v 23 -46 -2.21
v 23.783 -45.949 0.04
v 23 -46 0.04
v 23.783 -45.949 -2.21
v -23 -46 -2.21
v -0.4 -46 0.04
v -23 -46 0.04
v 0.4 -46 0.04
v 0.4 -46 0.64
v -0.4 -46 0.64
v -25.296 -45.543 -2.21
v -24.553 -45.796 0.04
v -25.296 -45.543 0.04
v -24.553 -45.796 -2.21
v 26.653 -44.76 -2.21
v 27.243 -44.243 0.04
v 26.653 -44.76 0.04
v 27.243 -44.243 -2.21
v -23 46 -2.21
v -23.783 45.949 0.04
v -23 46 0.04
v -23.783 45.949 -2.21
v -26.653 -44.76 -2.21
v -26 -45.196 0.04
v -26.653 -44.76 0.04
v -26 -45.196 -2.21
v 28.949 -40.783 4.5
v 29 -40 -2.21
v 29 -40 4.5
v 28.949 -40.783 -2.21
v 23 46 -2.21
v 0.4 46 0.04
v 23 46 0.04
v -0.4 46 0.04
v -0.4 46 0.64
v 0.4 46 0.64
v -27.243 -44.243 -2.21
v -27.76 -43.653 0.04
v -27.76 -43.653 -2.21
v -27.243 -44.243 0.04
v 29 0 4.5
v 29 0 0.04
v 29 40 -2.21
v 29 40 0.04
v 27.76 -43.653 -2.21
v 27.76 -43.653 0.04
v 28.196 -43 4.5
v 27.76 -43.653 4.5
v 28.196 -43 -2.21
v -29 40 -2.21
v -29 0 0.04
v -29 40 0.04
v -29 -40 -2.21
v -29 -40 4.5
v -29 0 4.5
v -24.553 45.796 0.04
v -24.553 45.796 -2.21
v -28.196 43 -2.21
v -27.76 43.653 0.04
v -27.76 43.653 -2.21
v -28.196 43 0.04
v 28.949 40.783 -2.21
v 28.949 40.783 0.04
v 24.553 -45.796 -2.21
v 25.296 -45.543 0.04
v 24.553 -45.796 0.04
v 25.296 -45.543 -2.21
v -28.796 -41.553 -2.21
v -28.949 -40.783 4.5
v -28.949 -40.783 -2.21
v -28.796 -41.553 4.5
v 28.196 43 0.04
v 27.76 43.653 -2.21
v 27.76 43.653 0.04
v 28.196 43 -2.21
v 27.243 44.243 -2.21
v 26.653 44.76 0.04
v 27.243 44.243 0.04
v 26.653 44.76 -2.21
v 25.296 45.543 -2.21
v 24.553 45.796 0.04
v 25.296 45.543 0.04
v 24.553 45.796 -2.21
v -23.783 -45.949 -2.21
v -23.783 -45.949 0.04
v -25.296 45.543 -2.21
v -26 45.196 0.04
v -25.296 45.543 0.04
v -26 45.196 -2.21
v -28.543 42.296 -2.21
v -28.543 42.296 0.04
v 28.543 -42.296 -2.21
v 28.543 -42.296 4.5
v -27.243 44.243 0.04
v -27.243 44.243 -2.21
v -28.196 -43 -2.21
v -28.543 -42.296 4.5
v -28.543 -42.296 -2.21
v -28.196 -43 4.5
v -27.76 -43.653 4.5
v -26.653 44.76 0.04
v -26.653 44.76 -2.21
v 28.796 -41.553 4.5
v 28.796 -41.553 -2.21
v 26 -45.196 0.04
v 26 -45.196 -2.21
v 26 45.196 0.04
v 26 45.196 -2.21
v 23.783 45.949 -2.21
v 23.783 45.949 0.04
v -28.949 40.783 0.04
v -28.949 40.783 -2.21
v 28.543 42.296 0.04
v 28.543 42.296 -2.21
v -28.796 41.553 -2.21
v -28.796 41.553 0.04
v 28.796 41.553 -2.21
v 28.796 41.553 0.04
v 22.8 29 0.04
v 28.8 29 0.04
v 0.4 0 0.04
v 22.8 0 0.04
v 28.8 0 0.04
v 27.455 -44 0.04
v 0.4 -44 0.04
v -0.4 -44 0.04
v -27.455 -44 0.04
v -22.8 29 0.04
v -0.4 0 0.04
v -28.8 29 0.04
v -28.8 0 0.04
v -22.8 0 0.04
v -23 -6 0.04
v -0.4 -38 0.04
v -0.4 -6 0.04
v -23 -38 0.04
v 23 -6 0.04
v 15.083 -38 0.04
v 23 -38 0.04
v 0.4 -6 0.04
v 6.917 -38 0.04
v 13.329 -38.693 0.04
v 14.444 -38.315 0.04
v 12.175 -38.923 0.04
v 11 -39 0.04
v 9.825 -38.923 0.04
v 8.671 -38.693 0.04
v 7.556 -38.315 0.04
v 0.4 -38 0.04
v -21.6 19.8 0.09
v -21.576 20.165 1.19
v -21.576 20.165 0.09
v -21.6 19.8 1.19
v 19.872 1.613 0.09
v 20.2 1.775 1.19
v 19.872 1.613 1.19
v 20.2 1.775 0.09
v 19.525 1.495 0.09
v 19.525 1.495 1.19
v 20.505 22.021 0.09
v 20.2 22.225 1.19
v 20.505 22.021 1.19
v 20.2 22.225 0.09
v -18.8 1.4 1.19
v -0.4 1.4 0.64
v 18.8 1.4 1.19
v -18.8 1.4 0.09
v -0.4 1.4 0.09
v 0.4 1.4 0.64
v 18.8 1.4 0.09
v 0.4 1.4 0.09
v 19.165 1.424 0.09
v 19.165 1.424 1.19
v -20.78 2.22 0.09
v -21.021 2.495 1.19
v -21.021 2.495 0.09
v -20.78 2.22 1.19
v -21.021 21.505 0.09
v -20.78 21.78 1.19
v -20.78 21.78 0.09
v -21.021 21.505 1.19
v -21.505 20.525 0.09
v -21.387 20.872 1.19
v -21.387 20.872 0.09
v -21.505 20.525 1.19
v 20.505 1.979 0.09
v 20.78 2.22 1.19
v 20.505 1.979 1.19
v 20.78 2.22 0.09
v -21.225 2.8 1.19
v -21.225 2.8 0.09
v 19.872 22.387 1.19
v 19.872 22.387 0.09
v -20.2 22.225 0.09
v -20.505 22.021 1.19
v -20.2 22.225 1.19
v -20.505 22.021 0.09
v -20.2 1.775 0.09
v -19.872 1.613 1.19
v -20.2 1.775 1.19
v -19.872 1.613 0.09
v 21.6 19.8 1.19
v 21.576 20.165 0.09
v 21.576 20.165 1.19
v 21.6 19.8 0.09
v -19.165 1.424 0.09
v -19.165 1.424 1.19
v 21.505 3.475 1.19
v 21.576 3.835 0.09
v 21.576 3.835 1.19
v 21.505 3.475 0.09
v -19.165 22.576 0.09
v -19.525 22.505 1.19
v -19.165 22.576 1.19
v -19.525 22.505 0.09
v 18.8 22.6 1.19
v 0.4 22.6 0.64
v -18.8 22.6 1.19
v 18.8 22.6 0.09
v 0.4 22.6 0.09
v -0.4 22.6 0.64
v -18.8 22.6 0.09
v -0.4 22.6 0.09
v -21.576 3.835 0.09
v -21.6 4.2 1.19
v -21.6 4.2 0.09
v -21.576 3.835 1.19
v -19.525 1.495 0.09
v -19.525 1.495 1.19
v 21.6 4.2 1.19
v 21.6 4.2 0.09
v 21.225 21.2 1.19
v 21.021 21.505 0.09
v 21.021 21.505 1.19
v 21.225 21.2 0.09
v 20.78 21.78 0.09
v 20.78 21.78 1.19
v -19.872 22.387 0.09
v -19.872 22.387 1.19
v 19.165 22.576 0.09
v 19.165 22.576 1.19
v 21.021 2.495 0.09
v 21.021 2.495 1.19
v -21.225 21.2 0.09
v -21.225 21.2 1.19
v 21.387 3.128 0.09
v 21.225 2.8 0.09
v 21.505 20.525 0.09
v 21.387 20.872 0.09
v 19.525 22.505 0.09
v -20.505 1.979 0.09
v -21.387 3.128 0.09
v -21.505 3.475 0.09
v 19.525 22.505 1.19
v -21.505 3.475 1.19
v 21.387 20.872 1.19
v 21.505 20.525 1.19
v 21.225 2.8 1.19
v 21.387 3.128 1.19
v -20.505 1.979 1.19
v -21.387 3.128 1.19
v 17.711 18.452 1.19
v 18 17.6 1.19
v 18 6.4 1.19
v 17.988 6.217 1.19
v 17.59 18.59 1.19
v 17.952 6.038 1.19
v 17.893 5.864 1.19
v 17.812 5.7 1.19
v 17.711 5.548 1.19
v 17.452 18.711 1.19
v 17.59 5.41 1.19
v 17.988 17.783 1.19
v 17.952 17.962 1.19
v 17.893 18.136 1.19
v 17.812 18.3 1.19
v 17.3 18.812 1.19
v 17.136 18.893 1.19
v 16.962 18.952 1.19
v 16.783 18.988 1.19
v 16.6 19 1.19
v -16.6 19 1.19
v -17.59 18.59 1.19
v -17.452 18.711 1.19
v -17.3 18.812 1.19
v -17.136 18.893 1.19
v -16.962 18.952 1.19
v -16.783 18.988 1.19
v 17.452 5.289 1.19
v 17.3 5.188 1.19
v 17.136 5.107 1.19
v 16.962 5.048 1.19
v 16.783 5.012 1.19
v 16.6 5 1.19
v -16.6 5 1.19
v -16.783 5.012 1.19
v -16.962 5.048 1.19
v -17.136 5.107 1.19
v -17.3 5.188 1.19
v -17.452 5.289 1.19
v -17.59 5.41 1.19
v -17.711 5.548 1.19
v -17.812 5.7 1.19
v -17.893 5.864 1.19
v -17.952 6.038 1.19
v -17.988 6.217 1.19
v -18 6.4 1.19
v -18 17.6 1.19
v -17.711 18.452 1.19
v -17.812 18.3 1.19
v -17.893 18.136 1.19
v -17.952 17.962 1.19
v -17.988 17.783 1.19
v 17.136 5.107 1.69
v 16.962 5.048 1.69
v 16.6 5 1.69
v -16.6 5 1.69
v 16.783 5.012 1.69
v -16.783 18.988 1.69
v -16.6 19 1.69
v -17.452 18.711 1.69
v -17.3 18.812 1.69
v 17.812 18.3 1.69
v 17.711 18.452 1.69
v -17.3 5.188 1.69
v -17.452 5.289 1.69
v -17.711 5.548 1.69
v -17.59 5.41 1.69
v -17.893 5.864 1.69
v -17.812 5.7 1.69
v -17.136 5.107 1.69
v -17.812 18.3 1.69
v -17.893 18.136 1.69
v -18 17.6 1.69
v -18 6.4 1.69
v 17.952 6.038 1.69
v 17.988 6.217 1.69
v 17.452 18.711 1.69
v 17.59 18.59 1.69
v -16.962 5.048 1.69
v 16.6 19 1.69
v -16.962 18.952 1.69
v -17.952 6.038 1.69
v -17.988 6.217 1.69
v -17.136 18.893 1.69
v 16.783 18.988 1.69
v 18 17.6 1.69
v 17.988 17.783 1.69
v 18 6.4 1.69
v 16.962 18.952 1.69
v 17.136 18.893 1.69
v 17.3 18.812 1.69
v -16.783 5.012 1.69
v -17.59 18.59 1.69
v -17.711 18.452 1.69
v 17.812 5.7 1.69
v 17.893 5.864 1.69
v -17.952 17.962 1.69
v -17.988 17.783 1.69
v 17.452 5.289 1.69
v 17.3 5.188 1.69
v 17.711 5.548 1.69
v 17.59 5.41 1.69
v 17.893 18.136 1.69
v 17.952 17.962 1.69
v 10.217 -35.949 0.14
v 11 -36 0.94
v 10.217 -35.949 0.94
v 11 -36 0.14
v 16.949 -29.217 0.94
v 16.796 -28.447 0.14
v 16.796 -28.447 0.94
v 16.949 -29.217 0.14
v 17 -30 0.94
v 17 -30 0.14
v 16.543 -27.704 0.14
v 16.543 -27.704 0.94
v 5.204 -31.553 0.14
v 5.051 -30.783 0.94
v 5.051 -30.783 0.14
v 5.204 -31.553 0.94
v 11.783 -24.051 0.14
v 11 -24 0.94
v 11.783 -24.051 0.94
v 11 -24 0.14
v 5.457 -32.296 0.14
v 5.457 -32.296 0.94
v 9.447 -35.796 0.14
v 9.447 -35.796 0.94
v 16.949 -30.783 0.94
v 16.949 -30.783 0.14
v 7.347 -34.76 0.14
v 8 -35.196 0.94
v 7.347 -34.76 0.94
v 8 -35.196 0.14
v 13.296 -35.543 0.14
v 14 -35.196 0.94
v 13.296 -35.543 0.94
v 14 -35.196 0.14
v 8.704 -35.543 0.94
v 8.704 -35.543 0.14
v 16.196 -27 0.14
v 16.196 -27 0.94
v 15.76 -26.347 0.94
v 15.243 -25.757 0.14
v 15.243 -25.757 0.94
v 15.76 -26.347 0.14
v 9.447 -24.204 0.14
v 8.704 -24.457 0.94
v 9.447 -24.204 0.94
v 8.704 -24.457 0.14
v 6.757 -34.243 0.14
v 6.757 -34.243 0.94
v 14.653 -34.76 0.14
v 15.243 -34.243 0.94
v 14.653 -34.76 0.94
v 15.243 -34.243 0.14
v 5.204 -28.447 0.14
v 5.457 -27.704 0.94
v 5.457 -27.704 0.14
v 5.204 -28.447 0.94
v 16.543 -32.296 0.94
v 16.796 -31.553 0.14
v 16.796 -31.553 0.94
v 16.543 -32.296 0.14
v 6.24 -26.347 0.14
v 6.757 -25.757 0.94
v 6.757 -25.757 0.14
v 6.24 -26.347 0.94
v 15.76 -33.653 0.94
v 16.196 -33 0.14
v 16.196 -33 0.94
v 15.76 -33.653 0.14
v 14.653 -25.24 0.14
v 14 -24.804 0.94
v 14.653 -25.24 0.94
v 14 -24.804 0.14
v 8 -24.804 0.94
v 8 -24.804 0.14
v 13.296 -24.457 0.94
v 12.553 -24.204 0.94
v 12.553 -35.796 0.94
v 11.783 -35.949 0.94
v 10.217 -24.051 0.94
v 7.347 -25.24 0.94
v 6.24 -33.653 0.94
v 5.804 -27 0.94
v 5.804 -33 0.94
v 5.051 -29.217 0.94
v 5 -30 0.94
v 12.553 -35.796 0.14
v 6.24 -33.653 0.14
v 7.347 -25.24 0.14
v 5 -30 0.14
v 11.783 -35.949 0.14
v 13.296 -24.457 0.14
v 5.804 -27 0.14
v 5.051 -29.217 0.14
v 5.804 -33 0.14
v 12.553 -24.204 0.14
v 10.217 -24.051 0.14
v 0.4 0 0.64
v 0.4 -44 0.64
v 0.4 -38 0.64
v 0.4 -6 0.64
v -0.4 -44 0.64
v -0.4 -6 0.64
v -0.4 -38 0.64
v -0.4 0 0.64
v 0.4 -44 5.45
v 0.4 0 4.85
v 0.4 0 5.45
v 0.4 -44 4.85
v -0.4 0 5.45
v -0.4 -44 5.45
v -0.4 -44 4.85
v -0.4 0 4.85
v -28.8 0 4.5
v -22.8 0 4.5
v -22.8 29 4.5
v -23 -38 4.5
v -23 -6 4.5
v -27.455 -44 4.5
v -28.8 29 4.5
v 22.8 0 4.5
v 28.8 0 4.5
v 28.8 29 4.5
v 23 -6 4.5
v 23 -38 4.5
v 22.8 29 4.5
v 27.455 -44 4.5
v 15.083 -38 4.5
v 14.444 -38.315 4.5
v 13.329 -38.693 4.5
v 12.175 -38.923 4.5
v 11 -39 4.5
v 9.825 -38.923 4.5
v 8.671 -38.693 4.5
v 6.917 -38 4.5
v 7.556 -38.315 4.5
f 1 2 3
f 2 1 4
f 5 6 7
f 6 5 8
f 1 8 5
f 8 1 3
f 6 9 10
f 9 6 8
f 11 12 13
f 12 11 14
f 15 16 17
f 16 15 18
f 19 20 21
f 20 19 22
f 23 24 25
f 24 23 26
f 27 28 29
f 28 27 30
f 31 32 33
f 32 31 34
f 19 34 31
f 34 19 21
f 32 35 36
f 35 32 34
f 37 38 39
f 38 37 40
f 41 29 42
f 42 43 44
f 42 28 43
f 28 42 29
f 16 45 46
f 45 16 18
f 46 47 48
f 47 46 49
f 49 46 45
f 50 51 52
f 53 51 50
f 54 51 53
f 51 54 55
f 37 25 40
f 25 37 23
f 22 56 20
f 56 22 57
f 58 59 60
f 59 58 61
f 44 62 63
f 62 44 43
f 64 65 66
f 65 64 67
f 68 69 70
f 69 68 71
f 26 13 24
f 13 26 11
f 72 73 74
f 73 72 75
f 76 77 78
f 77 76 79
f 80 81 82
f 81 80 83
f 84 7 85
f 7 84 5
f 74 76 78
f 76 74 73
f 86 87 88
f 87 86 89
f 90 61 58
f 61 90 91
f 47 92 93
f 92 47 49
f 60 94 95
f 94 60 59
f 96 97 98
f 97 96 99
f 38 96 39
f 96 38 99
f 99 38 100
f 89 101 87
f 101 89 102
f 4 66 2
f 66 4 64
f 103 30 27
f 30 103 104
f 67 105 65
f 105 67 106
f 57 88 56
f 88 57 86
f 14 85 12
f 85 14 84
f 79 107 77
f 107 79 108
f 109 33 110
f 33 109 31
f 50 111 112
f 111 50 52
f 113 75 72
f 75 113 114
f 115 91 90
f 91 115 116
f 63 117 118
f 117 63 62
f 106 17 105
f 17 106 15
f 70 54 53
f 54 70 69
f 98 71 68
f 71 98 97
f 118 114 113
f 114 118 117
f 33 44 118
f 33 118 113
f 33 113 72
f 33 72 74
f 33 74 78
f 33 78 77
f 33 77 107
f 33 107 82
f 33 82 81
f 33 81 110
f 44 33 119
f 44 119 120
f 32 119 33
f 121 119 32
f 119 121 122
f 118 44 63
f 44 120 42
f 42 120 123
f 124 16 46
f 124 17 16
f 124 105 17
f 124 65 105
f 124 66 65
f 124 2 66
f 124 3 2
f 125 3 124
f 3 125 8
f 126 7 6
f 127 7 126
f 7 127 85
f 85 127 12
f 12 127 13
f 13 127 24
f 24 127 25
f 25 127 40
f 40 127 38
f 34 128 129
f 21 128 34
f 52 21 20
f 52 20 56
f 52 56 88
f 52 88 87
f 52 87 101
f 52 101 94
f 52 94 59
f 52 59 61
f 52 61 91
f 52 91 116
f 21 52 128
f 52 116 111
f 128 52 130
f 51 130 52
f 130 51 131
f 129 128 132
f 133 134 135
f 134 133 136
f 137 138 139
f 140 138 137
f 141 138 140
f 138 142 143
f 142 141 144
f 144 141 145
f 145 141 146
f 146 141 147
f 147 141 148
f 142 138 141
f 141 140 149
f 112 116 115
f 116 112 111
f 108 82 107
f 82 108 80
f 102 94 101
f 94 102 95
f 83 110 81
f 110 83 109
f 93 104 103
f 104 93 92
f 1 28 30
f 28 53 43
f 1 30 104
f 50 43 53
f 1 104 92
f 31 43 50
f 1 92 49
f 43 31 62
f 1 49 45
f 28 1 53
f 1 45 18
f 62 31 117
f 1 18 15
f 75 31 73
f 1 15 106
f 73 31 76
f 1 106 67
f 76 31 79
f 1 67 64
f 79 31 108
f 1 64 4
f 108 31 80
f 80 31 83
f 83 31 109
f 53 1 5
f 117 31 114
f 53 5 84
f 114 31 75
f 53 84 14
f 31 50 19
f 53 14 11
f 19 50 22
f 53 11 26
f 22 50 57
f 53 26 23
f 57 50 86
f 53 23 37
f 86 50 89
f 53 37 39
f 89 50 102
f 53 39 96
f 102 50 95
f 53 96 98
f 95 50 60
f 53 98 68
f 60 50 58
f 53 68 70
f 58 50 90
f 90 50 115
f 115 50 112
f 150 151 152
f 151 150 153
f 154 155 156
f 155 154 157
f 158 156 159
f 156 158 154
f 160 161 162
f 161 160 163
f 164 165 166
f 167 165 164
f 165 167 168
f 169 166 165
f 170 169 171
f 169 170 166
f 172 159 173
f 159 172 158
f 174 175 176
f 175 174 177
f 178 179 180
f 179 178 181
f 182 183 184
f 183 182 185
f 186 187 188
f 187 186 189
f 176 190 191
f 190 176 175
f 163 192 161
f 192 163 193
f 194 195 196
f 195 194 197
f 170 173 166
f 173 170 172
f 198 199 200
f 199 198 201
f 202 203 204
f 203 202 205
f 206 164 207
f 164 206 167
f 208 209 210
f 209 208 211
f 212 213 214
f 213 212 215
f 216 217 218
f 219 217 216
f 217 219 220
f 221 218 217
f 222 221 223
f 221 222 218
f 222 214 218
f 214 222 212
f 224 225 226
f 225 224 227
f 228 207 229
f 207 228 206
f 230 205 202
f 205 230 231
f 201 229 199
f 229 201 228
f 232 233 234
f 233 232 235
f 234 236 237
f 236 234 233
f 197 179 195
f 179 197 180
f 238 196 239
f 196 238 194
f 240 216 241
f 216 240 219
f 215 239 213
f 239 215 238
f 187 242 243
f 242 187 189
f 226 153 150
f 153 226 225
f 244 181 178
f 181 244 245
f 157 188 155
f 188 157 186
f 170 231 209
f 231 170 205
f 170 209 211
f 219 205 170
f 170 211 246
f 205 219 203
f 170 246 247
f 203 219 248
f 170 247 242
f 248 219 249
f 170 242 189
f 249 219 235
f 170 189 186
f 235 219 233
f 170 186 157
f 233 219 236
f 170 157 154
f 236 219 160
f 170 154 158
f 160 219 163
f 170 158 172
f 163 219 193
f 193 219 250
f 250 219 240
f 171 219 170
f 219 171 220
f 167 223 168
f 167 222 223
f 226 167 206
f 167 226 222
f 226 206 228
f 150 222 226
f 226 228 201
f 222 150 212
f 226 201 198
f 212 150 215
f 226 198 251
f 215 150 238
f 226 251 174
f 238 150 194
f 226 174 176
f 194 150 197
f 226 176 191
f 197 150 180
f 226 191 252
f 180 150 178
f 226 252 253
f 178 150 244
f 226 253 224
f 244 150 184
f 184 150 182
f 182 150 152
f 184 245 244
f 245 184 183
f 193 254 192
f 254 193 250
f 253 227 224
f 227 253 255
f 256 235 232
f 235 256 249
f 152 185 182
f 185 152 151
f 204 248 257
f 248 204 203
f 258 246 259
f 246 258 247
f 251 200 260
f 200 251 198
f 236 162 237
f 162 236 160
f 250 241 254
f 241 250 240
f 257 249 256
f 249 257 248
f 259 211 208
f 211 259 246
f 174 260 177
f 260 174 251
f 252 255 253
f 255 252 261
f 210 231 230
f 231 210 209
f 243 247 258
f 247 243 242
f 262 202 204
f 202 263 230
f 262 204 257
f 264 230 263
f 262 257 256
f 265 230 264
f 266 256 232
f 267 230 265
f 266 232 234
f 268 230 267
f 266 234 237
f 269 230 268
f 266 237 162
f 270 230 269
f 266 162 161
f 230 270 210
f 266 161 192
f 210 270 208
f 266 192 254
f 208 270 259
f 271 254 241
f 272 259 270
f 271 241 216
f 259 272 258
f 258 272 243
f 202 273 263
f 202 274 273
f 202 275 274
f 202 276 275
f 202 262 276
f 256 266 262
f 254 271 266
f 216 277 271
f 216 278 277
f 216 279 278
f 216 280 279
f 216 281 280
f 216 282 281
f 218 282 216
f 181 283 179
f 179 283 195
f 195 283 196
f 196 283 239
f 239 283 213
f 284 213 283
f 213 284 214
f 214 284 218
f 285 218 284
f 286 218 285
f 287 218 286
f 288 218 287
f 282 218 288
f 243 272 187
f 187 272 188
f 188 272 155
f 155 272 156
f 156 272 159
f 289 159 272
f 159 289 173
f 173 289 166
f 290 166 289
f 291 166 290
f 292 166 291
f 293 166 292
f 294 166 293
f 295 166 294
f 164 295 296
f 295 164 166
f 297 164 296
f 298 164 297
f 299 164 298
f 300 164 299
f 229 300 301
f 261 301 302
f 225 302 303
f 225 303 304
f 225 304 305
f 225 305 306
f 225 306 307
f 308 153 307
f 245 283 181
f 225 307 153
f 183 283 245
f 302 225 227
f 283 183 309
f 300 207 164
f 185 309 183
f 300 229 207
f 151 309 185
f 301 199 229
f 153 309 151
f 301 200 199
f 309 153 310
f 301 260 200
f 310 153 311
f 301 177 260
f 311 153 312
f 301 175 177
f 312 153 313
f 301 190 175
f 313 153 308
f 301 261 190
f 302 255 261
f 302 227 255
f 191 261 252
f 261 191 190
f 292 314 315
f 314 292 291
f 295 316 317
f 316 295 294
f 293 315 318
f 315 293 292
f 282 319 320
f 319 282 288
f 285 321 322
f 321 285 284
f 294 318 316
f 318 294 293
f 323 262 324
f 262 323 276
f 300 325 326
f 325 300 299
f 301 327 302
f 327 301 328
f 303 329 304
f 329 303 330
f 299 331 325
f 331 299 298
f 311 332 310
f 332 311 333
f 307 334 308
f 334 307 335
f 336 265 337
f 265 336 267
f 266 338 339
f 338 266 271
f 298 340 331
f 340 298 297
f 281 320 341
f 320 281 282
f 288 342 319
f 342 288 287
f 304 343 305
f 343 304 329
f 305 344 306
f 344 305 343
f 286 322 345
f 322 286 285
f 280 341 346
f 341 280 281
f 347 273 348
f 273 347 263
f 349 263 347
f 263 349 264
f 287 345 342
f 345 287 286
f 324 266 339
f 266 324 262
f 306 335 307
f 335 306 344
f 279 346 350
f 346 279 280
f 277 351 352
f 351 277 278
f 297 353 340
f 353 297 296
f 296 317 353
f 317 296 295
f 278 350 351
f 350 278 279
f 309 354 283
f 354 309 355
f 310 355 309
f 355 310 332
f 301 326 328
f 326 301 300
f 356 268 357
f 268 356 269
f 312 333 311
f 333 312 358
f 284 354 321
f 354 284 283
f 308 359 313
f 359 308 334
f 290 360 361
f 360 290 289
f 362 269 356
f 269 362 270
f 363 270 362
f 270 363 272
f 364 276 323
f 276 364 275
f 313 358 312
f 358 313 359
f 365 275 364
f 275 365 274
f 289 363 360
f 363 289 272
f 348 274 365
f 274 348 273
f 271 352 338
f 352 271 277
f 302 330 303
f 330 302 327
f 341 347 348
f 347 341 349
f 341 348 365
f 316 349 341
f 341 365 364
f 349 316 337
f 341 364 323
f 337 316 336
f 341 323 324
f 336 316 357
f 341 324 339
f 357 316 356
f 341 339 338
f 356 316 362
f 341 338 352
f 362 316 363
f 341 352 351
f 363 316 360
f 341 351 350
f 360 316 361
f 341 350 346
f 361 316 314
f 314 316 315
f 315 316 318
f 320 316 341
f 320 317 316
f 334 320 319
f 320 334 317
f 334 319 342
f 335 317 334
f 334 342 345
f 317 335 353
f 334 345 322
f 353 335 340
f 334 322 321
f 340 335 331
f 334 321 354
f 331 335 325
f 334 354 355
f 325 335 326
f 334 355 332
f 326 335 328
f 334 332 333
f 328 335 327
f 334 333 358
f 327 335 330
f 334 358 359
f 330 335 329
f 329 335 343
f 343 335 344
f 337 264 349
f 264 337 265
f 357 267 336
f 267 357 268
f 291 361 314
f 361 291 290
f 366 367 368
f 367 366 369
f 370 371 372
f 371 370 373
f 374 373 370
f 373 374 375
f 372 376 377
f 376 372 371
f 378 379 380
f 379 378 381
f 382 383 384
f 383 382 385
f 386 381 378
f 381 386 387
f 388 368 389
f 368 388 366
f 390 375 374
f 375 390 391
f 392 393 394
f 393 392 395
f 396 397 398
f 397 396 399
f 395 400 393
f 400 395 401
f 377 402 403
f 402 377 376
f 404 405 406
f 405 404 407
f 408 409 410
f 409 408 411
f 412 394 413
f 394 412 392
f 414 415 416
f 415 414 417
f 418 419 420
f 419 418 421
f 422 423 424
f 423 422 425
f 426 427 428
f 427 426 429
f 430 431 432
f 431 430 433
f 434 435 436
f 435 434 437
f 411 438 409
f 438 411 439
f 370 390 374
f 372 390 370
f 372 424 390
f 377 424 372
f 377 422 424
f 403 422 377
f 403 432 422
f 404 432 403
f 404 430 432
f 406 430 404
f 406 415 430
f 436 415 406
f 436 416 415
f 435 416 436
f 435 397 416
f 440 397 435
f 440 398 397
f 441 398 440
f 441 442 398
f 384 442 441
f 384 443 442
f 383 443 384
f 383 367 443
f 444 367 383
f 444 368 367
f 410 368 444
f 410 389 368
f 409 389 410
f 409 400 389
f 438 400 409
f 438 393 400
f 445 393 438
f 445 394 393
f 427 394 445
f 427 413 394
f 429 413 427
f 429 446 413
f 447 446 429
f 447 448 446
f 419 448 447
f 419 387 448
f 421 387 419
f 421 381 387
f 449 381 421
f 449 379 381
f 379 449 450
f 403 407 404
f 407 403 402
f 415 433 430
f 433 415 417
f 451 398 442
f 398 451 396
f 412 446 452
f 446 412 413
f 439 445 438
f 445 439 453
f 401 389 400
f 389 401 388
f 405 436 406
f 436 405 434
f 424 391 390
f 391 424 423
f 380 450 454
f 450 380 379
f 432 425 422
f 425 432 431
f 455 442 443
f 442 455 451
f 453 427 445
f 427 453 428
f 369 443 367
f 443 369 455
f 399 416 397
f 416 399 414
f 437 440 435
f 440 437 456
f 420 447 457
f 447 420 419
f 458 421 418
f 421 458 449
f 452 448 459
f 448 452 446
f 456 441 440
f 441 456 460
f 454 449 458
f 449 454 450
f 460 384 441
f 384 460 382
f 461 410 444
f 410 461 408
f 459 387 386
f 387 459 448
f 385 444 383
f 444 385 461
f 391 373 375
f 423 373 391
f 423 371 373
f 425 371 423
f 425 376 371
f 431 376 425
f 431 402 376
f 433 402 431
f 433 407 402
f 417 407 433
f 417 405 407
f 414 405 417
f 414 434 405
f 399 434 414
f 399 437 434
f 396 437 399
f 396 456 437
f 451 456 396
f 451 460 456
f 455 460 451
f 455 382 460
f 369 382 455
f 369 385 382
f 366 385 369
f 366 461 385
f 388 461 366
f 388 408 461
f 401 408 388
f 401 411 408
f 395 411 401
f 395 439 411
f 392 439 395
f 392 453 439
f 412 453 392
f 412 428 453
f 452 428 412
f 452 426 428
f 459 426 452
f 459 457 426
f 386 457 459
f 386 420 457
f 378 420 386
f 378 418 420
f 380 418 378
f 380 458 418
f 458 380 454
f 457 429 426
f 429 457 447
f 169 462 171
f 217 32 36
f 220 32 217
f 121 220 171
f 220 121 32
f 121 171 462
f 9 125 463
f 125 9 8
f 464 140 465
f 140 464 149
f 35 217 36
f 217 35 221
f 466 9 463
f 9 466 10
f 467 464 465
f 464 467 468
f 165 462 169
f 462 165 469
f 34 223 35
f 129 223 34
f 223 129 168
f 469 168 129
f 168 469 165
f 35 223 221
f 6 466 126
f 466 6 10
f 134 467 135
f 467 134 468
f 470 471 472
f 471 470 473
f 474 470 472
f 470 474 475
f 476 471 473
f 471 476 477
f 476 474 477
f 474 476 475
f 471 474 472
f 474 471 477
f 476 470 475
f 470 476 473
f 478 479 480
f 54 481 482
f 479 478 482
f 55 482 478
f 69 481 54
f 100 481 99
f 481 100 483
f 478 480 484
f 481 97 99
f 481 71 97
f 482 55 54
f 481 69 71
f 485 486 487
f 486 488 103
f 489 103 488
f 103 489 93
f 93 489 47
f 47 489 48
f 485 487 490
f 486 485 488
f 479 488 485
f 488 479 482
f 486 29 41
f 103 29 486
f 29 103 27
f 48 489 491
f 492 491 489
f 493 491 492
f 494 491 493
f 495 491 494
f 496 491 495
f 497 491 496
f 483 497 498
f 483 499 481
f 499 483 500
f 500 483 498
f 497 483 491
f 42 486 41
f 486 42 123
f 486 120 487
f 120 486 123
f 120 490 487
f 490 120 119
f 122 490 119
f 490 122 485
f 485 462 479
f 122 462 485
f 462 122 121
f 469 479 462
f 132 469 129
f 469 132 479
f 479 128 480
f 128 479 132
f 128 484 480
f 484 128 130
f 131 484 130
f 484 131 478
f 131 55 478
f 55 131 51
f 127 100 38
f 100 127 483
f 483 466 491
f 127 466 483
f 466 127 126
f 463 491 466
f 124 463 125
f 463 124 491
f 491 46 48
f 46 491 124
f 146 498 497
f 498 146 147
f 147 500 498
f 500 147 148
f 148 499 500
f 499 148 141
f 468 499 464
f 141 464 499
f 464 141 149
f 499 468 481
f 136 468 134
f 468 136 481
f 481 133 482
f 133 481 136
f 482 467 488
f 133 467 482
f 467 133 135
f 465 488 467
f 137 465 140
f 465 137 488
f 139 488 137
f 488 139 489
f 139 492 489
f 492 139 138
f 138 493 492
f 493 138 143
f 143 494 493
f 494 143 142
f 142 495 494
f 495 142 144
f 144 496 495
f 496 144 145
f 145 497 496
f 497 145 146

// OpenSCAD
/*
  Sagemcom-style water meter accessory mount
  Stage 1: minimal button-area frame

  This is intentionally much simpler than the earlier faceplate:
  - a rectangular lower-front frame spanning the full meter width
  - a round button access hole
  - no strap tabs yet
  - no camera mount yet
  - no solenoid mount yet

  The goal of this part is only to validate:
  - how much front-area coverage is acceptable
  - the front shape only, before retention details are added
  - the actual button location relative to the visible housing
*/

// ---------------------------------------------------------------------------
// User-editable parameters
// ---------------------------------------------------------------------------

part_to_render = "preview";   // preview, button_frame_base
show_reference_housing = true;
show_centerlines = true;

// Known housing front footprint
housing_w = 58;
housing_h = 92;
housing_corner_r = 6;   // estimated

// Button location on the front face
// Measure `button_x_from_left` on the real meter if possible.
// `mirror_button_x` exists because the workspace photo is rotated and not
// trustworthy enough for left/right handedness.
button_x_from_left = 18;
mirror_button_x = true;
button_y = 16;          // from the nearest short edge
button_d = 12;          // estimated

// Display opening on the front face
// Estimated from the meter photo. Update once measured.
display_x_from_left = housing_w / 2;  // keep LCD centered on housing X
display_y_from_bottom = 58;
display_y_offset = 0;                 // fine vertical adjustment if needed
display_w = 40;
display_h = 18;
display_corner_r = 2;
display_bezel_margin = 1.6;
display_bezel_t = 1.1;
display_active_inset = 2.0;
display_active_t = 0.5;

// Lower frame that follows housing shape and stops below the display
frame_t = 4.5;
frame_wall = 6;
frame_to_display_gap = 3;
bottom_edge_margin = 2;
button_relief_d = 18;
centerline_w = 0.8;
housing_ref_t = frame_t * 0.5;
housing_ref_touch_overlap = 0.04;  // tiny overlap so reference and frame "just touch" in Z

// Side extensions for extra zip-tieability above the display.
side_upright_enable = true;
side_upright_w = frame_wall;       // match original frame border width
side_upright_above_display = 8;    // how far rails extend above display top
side_upright_display_clearance = 1.2; // keep rails clear of LCD bezel envelope

$fn = 48;

// ---------------------------------------------------------------------------
// Derived values
// ---------------------------------------------------------------------------

button_pos = [
    -housing_w / 2 + (mirror_button_x ? (housing_w - button_x_from_left) : button_x_from_left),
    -housing_h / 2 + button_y
];

display_pos = [
    -housing_w / 2 + display_x_from_left,
    -housing_h / 2 + display_y_from_bottom + display_y_offset
];

display_bottom_y = display_pos[1] - display_h / 2;
display_top_y = display_pos[1] + display_h / 2;
frame_top_y = display_bottom_y - frame_to_display_gap;
frame_bottom_y = -housing_h / 2 + bottom_edge_margin;
frame_mid_y = (frame_bottom_y + frame_top_y) / 2;
side_upright_top_y = min(housing_h / 2 - 1, display_top_y + side_upright_above_display);
display_bezel_half_w = (display_w + 2 * display_bezel_margin) / 2;
side_upright_x_abs = min(
    housing_w / 2 - side_upright_w / 2 - 0.2,
    display_bezel_half_w + side_upright_display_clearance + side_upright_w / 2
);
housing_ref_top_z = housing_ref_touch_overlap;
housing_ref_center_z = housing_ref_top_z - housing_ref_t / 2;

// ---------------------------------------------------------------------------
// Helpers
// ---------------------------------------------------------------------------

function clampv(v, lo, hi) = min(max(v, lo), hi);

module rounded_box(size = [20, 20, 5], r = 2, center = true) {
    sx = size[0];
    sy = size[1];
    sz = size[2];
    rr = clampv(r, 0, min(sx, sy) / 2 - 0.01);

    // Keep the rounded box truly centered in X/Y when center=true.
    // Using a centered 2D profile avoids an implicit -r shift from offset().
    translate(center ? [0, 0, 0] : [sx / 2, sy / 2, sz / 2])
        linear_extrude(height = sz, center = true)
            offset(r = rr)
                square([sx - 2 * rr, sy - 2 * rr], center = true);
}

module housing_reference() {
    color([0.95, 0.95, 0.95, 0.35])
        translate([0, 0, housing_ref_center_z])
            rounded_box([housing_w, housing_h, housing_ref_t], housing_corner_r, center = true);

    // LCD reference as bezel + active screen area.
    color([0.08, 0.08, 0.08, 0.9])
        translate([display_pos[0], display_pos[1], housing_ref_top_z + display_bezel_t / 2 + 0.05])
            rounded_box(
                [display_w + 2 * display_bezel_margin, display_h + 2 * display_bezel_margin, display_bezel_t],
                display_corner_r + 0.8,
                center = true
            );

    color([0.18, 0.42, 0.18, 0.9])
        translate([display_pos[0], display_pos[1], housing_ref_top_z + display_bezel_t + display_active_t / 2 + 0.05])
            rounded_box(
                [display_w - 2 * display_active_inset, display_h - 2 * display_active_inset, display_active_t],
                max(0.6, display_corner_r - 0.6),
                center = true
            );

    color([0.15, 0.35, 0.95, 0.85])
        translate([button_pos[0], button_pos[1], housing_ref_top_z + 0.1])
            cylinder(h = 0.8, d = button_d);
}

module housing_centerlines() {
    // X-centerline of housing reference (this is the relevant centering check).
    color([0.9, 0.2, 0.2, 0.8])
        translate([0, 0, housing_ref_top_z + 0.3])
            cube([centerline_w, housing_h, 0.6], center = true);
}

module frame_centerlines() {
    // X-centerline of the lower frame band. Should overlap housing X-centerline.
    color([0.95, 0.05, 0.85, 0.85])
        translate([0, frame_mid_y, frame_t + 0.65])
            cube([centerline_w, frame_top_y - frame_bottom_y, 0.6], center = true);
}

module housing_outline_2d() {
    offset(r = housing_corner_r)
        square([housing_w - 2 * housing_corner_r, housing_h - 2 * housing_corner_r], center = true);
}

module lower_band_mask_2d() {
    translate([0, (frame_bottom_y + frame_top_y) / 2])
        square([housing_w + 8, frame_top_y - frame_bottom_y], center = true);
}

module side_upright_mask_2d() {
    rail_h = side_upright_top_y - frame_bottom_y;
    for (sx = [-1, 1]) {
        translate([
            sx * side_upright_x_abs,
            (frame_bottom_y + side_upright_top_y) / 2
        ])
            square([side_upright_w, rail_h], center = true);
    }
}

module outer_frame_region_2d() {
    intersection() {
        housing_outline_2d();
        union() {
            lower_band_mask_2d();
            if (side_upright_enable)
                side_upright_mask_2d();
        }
    }
}

// ---------------------------------------------------------------------------
// Stage 1 part
// ---------------------------------------------------------------------------

module button_frame_base() {
    linear_extrude(height = frame_t)
        difference() {
            outer_frame_region_2d();

            // True frame: inward offset creates uniform wall thickness.
            offset(delta = -frame_wall)
                outer_frame_region_2d();

            // Dedicated button opening through the frame.
            translate(button_pos)
                circle(d = button_relief_d);
        }
}

module preview() {
    if (show_reference_housing)
        housing_reference();

    color([0.95, 0.7, 0.1, 0.75])
        button_frame_base();

    if (show_centerlines) {
        if (show_reference_housing)
            housing_centerlines();
        frame_centerlines();
    }
}

// ---------------------------------------------------------------------------
// Render selector
// ---------------------------------------------------------------------------

if (part_to_render == "button_frame_base")
    button_frame_base();

if (part_to_render == "preview")
    preview();
